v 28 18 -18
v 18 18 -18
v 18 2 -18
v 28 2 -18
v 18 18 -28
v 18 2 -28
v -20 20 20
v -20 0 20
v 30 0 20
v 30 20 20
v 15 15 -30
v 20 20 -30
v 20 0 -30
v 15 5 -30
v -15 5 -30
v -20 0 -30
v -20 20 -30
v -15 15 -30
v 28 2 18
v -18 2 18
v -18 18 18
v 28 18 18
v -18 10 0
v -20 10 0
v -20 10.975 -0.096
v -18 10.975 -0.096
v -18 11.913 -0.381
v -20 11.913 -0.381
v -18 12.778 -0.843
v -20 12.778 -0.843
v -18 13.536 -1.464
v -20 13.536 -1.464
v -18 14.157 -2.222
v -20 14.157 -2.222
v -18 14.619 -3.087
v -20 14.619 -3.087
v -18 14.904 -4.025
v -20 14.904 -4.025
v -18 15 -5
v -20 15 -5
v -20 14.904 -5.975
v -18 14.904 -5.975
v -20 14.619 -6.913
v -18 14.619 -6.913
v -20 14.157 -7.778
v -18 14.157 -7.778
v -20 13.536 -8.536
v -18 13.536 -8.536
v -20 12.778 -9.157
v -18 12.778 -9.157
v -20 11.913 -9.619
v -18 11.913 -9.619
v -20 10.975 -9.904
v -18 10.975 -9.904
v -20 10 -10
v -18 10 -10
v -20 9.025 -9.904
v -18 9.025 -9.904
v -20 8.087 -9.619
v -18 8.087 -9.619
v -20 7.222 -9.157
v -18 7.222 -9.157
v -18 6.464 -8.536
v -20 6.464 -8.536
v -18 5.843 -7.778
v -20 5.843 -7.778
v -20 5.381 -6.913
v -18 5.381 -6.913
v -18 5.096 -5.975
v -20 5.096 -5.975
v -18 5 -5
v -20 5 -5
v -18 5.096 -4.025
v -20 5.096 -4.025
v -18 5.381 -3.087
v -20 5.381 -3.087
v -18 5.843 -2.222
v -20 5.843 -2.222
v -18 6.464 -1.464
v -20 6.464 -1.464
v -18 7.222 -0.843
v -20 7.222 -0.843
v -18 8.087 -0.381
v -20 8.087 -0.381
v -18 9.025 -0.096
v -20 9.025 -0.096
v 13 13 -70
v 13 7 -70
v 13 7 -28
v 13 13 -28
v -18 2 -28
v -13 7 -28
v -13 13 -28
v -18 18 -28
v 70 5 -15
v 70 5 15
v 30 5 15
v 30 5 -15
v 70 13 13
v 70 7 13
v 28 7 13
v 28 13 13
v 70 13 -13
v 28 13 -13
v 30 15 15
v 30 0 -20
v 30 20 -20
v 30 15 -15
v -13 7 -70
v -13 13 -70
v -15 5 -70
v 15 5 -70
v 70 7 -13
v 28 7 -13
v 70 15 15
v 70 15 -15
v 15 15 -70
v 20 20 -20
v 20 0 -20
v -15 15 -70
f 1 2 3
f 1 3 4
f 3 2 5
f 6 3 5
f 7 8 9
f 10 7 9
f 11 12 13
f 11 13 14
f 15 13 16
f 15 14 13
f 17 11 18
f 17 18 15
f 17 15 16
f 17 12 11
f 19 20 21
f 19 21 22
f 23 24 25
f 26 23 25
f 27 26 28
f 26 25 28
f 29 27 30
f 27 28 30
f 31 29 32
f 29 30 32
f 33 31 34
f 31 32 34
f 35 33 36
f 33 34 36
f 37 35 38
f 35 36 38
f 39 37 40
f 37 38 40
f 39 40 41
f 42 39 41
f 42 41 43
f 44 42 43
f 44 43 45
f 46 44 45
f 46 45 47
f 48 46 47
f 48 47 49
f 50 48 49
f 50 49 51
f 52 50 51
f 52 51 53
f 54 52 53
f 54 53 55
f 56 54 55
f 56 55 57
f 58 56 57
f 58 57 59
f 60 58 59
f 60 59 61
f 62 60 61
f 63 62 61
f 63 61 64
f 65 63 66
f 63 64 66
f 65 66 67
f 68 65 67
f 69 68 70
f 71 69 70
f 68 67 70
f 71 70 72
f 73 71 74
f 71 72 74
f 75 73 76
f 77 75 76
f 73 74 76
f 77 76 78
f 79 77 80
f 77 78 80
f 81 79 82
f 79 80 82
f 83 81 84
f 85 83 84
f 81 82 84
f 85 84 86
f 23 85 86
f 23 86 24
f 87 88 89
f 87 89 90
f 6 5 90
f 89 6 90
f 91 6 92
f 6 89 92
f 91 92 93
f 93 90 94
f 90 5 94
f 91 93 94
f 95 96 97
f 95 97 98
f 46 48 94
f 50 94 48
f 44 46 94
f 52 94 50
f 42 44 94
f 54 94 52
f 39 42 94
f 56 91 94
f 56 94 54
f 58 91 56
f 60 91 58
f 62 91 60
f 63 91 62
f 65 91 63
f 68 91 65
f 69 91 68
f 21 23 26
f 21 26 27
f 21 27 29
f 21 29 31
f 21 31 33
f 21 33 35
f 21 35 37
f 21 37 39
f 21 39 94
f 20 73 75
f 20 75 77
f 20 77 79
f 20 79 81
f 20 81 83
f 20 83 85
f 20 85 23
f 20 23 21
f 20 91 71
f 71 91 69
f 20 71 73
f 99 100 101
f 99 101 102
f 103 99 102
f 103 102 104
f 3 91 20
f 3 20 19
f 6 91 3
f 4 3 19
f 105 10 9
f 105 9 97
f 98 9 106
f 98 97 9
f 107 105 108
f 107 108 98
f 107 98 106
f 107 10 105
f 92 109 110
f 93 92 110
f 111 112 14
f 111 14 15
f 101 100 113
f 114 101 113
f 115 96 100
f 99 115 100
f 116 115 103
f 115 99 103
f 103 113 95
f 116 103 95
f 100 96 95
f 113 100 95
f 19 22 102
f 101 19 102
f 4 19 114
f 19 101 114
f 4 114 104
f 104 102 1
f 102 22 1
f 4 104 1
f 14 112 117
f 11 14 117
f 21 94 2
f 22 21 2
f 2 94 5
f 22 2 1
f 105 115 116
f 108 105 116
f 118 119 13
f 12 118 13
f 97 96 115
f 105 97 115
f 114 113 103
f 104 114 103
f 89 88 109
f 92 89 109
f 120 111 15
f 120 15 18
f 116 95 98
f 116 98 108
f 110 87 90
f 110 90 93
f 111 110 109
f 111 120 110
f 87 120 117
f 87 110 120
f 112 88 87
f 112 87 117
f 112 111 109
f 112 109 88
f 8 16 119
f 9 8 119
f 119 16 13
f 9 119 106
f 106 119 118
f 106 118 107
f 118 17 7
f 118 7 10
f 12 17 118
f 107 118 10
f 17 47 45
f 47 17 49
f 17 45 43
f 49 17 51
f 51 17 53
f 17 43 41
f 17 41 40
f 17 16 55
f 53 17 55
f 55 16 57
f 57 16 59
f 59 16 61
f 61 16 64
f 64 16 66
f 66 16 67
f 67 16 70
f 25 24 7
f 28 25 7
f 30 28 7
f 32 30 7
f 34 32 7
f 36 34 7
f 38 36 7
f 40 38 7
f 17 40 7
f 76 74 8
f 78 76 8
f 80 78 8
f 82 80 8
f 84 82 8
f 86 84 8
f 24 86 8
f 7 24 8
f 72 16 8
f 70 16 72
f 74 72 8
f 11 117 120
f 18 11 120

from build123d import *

# Parameters (mm, degrees)
CROQUIS1_W     = 40
CROQUIS1_H     = 50
CROQUIS1_H_2   = 40
CROQUIS1_W_2   = 50
EXTRUIR1_DEPTH = 20
CROQUIS2_W     = 40
CROQUIS2_H     = 20
CROQUIS2_W_2   = 30
CROQUIS2_H_2   = 10
EXTRUIR2_DEPTH = 40
CROQUIS3_W     = 40
CROQUIS3_H     = 20
CROQUIS3_W_2   = 30
CROQUIS3_H_2   = 10
EXTRUIR3_DEPTH = 40
VACIADO1_T     = -2
CROQUIS5_R     = 5
EXTRUIR4_DEPTH = 10


with BuildPart() as part:
    # Croquis1 → Extruir1 (new body)
    with BuildSketch(Plane(origin=(0, 0, 0), x_dir=(1, 0, 0), z_dir=(0, 1, 0))):
        with Locations((0, 45)):
            Rectangle(CROQUIS1_W, CROQUIS1_H)
        Rectangle(CROQUIS1_W, CROQUIS1_H_2)
        with Locations((45, 0)):
            Rectangle(CROQUIS1_W_2, CROQUIS1_H_2)
    extrude(amount=EXTRUIR1_DEPTH)

    # Croquis2 → Extruir2 (cut)
    with BuildSketch(Plane(origin=(70, 0, 0), x_dir=(0, 0, -1), z_dir=(1, 0, 0))):
        with Locations((0, 10)):
            Rectangle(CROQUIS2_W, CROQUIS2_H)
        with Locations((0, 10)):
            Rectangle(CROQUIS2_W_2, CROQUIS2_H_2, mode=Mode.SUBTRACT)
    extrude(amount=-EXTRUIR2_DEPTH, mode=Mode.SUBTRACT)

    # Croquis3 → Extruir3 (cut)
    with BuildSketch(Plane(origin=(0, 0, -70), x_dir=(-1, 0, 0), z_dir=(0, 0, -1))):
        with Locations((0, 10)):
            Rectangle(CROQUIS3_W, CROQUIS3_H)
        with Locations((0, 10)):
            Rectangle(CROQUIS3_W_2, CROQUIS3_H_2, mode=Mode.SUBTRACT)
    extrude(amount=-EXTRUIR3_DEPTH, mode=Mode.SUBTRACT)

    # Vaciado1
    vaciado1_openings = [part.faces().sort_by_distance(p)[0] for p in [
        (70, 10, 0),
        (0, 10, -70),
    ]]
    offset(amount=VACIADO1_T, openings=vaciado1_openings, kind=Kind.INTERSECTION)

    # Croquis5 → Extruir4 (cut)
    with BuildSketch(Plane.ZY.offset(20)):
        with Locations((-5, 10)):
            Circle(CROQUIS5_R)
    extrude(amount=-EXTRUIR4_DEPTH, mode=Mode.SUBTRACT)


solid = part.part
